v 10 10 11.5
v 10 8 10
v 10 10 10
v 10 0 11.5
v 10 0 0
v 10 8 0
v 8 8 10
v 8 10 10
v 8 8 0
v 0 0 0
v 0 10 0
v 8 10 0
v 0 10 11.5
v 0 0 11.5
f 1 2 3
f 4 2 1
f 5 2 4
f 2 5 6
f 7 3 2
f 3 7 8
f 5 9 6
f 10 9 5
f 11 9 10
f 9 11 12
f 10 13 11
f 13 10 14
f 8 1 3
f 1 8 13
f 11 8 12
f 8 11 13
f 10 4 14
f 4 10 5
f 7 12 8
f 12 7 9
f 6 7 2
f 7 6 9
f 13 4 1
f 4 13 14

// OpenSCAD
// file: ../lib/shared-constants.scad
// Included by the lib, to exercise recursive inlining.
NOTCH = 2;
LID_THICKNESS = 1.5;
// file: ../lib/fixture-cube-lib.scad
// Fixture model for model-forge tests. Deliberately trivial so renders are fast.

include <shared-constants.scad>;

// BEGIN_PARAMS

// Edge length of the box (mm).
size = 10;

// Height multiplier.
height_mult = 1;

// Which corner to notch.
corner = "ne";  // [ne, nw, se, sw]

// Cut the notch at all.
notched = true;

// END_PARAMS

module box() {
  difference() {
    cube([size, size, size * height_mult]);
    if (notched) translate([size - NOTCH, size - NOTCH, 0]) cube([NOTCH, NOTCH, size]);
  }
}

module lid() {
  cube([size, size, LID_THICKNESS]);
}
// main file
include <../lib/fixture-cube-lib.scad>;
$fn = 16;

// Hex colour literals, which OpenSCAD does not resolve to a vector when the
// source is compiled directly. The CLI path regex-scans for these; the WASM
// engine discovers them by echoing str(c). Both must handle the hex form.
color("#3a7ad9") box();
color("#d65f9a") translate([0, 0, size]) lid();
